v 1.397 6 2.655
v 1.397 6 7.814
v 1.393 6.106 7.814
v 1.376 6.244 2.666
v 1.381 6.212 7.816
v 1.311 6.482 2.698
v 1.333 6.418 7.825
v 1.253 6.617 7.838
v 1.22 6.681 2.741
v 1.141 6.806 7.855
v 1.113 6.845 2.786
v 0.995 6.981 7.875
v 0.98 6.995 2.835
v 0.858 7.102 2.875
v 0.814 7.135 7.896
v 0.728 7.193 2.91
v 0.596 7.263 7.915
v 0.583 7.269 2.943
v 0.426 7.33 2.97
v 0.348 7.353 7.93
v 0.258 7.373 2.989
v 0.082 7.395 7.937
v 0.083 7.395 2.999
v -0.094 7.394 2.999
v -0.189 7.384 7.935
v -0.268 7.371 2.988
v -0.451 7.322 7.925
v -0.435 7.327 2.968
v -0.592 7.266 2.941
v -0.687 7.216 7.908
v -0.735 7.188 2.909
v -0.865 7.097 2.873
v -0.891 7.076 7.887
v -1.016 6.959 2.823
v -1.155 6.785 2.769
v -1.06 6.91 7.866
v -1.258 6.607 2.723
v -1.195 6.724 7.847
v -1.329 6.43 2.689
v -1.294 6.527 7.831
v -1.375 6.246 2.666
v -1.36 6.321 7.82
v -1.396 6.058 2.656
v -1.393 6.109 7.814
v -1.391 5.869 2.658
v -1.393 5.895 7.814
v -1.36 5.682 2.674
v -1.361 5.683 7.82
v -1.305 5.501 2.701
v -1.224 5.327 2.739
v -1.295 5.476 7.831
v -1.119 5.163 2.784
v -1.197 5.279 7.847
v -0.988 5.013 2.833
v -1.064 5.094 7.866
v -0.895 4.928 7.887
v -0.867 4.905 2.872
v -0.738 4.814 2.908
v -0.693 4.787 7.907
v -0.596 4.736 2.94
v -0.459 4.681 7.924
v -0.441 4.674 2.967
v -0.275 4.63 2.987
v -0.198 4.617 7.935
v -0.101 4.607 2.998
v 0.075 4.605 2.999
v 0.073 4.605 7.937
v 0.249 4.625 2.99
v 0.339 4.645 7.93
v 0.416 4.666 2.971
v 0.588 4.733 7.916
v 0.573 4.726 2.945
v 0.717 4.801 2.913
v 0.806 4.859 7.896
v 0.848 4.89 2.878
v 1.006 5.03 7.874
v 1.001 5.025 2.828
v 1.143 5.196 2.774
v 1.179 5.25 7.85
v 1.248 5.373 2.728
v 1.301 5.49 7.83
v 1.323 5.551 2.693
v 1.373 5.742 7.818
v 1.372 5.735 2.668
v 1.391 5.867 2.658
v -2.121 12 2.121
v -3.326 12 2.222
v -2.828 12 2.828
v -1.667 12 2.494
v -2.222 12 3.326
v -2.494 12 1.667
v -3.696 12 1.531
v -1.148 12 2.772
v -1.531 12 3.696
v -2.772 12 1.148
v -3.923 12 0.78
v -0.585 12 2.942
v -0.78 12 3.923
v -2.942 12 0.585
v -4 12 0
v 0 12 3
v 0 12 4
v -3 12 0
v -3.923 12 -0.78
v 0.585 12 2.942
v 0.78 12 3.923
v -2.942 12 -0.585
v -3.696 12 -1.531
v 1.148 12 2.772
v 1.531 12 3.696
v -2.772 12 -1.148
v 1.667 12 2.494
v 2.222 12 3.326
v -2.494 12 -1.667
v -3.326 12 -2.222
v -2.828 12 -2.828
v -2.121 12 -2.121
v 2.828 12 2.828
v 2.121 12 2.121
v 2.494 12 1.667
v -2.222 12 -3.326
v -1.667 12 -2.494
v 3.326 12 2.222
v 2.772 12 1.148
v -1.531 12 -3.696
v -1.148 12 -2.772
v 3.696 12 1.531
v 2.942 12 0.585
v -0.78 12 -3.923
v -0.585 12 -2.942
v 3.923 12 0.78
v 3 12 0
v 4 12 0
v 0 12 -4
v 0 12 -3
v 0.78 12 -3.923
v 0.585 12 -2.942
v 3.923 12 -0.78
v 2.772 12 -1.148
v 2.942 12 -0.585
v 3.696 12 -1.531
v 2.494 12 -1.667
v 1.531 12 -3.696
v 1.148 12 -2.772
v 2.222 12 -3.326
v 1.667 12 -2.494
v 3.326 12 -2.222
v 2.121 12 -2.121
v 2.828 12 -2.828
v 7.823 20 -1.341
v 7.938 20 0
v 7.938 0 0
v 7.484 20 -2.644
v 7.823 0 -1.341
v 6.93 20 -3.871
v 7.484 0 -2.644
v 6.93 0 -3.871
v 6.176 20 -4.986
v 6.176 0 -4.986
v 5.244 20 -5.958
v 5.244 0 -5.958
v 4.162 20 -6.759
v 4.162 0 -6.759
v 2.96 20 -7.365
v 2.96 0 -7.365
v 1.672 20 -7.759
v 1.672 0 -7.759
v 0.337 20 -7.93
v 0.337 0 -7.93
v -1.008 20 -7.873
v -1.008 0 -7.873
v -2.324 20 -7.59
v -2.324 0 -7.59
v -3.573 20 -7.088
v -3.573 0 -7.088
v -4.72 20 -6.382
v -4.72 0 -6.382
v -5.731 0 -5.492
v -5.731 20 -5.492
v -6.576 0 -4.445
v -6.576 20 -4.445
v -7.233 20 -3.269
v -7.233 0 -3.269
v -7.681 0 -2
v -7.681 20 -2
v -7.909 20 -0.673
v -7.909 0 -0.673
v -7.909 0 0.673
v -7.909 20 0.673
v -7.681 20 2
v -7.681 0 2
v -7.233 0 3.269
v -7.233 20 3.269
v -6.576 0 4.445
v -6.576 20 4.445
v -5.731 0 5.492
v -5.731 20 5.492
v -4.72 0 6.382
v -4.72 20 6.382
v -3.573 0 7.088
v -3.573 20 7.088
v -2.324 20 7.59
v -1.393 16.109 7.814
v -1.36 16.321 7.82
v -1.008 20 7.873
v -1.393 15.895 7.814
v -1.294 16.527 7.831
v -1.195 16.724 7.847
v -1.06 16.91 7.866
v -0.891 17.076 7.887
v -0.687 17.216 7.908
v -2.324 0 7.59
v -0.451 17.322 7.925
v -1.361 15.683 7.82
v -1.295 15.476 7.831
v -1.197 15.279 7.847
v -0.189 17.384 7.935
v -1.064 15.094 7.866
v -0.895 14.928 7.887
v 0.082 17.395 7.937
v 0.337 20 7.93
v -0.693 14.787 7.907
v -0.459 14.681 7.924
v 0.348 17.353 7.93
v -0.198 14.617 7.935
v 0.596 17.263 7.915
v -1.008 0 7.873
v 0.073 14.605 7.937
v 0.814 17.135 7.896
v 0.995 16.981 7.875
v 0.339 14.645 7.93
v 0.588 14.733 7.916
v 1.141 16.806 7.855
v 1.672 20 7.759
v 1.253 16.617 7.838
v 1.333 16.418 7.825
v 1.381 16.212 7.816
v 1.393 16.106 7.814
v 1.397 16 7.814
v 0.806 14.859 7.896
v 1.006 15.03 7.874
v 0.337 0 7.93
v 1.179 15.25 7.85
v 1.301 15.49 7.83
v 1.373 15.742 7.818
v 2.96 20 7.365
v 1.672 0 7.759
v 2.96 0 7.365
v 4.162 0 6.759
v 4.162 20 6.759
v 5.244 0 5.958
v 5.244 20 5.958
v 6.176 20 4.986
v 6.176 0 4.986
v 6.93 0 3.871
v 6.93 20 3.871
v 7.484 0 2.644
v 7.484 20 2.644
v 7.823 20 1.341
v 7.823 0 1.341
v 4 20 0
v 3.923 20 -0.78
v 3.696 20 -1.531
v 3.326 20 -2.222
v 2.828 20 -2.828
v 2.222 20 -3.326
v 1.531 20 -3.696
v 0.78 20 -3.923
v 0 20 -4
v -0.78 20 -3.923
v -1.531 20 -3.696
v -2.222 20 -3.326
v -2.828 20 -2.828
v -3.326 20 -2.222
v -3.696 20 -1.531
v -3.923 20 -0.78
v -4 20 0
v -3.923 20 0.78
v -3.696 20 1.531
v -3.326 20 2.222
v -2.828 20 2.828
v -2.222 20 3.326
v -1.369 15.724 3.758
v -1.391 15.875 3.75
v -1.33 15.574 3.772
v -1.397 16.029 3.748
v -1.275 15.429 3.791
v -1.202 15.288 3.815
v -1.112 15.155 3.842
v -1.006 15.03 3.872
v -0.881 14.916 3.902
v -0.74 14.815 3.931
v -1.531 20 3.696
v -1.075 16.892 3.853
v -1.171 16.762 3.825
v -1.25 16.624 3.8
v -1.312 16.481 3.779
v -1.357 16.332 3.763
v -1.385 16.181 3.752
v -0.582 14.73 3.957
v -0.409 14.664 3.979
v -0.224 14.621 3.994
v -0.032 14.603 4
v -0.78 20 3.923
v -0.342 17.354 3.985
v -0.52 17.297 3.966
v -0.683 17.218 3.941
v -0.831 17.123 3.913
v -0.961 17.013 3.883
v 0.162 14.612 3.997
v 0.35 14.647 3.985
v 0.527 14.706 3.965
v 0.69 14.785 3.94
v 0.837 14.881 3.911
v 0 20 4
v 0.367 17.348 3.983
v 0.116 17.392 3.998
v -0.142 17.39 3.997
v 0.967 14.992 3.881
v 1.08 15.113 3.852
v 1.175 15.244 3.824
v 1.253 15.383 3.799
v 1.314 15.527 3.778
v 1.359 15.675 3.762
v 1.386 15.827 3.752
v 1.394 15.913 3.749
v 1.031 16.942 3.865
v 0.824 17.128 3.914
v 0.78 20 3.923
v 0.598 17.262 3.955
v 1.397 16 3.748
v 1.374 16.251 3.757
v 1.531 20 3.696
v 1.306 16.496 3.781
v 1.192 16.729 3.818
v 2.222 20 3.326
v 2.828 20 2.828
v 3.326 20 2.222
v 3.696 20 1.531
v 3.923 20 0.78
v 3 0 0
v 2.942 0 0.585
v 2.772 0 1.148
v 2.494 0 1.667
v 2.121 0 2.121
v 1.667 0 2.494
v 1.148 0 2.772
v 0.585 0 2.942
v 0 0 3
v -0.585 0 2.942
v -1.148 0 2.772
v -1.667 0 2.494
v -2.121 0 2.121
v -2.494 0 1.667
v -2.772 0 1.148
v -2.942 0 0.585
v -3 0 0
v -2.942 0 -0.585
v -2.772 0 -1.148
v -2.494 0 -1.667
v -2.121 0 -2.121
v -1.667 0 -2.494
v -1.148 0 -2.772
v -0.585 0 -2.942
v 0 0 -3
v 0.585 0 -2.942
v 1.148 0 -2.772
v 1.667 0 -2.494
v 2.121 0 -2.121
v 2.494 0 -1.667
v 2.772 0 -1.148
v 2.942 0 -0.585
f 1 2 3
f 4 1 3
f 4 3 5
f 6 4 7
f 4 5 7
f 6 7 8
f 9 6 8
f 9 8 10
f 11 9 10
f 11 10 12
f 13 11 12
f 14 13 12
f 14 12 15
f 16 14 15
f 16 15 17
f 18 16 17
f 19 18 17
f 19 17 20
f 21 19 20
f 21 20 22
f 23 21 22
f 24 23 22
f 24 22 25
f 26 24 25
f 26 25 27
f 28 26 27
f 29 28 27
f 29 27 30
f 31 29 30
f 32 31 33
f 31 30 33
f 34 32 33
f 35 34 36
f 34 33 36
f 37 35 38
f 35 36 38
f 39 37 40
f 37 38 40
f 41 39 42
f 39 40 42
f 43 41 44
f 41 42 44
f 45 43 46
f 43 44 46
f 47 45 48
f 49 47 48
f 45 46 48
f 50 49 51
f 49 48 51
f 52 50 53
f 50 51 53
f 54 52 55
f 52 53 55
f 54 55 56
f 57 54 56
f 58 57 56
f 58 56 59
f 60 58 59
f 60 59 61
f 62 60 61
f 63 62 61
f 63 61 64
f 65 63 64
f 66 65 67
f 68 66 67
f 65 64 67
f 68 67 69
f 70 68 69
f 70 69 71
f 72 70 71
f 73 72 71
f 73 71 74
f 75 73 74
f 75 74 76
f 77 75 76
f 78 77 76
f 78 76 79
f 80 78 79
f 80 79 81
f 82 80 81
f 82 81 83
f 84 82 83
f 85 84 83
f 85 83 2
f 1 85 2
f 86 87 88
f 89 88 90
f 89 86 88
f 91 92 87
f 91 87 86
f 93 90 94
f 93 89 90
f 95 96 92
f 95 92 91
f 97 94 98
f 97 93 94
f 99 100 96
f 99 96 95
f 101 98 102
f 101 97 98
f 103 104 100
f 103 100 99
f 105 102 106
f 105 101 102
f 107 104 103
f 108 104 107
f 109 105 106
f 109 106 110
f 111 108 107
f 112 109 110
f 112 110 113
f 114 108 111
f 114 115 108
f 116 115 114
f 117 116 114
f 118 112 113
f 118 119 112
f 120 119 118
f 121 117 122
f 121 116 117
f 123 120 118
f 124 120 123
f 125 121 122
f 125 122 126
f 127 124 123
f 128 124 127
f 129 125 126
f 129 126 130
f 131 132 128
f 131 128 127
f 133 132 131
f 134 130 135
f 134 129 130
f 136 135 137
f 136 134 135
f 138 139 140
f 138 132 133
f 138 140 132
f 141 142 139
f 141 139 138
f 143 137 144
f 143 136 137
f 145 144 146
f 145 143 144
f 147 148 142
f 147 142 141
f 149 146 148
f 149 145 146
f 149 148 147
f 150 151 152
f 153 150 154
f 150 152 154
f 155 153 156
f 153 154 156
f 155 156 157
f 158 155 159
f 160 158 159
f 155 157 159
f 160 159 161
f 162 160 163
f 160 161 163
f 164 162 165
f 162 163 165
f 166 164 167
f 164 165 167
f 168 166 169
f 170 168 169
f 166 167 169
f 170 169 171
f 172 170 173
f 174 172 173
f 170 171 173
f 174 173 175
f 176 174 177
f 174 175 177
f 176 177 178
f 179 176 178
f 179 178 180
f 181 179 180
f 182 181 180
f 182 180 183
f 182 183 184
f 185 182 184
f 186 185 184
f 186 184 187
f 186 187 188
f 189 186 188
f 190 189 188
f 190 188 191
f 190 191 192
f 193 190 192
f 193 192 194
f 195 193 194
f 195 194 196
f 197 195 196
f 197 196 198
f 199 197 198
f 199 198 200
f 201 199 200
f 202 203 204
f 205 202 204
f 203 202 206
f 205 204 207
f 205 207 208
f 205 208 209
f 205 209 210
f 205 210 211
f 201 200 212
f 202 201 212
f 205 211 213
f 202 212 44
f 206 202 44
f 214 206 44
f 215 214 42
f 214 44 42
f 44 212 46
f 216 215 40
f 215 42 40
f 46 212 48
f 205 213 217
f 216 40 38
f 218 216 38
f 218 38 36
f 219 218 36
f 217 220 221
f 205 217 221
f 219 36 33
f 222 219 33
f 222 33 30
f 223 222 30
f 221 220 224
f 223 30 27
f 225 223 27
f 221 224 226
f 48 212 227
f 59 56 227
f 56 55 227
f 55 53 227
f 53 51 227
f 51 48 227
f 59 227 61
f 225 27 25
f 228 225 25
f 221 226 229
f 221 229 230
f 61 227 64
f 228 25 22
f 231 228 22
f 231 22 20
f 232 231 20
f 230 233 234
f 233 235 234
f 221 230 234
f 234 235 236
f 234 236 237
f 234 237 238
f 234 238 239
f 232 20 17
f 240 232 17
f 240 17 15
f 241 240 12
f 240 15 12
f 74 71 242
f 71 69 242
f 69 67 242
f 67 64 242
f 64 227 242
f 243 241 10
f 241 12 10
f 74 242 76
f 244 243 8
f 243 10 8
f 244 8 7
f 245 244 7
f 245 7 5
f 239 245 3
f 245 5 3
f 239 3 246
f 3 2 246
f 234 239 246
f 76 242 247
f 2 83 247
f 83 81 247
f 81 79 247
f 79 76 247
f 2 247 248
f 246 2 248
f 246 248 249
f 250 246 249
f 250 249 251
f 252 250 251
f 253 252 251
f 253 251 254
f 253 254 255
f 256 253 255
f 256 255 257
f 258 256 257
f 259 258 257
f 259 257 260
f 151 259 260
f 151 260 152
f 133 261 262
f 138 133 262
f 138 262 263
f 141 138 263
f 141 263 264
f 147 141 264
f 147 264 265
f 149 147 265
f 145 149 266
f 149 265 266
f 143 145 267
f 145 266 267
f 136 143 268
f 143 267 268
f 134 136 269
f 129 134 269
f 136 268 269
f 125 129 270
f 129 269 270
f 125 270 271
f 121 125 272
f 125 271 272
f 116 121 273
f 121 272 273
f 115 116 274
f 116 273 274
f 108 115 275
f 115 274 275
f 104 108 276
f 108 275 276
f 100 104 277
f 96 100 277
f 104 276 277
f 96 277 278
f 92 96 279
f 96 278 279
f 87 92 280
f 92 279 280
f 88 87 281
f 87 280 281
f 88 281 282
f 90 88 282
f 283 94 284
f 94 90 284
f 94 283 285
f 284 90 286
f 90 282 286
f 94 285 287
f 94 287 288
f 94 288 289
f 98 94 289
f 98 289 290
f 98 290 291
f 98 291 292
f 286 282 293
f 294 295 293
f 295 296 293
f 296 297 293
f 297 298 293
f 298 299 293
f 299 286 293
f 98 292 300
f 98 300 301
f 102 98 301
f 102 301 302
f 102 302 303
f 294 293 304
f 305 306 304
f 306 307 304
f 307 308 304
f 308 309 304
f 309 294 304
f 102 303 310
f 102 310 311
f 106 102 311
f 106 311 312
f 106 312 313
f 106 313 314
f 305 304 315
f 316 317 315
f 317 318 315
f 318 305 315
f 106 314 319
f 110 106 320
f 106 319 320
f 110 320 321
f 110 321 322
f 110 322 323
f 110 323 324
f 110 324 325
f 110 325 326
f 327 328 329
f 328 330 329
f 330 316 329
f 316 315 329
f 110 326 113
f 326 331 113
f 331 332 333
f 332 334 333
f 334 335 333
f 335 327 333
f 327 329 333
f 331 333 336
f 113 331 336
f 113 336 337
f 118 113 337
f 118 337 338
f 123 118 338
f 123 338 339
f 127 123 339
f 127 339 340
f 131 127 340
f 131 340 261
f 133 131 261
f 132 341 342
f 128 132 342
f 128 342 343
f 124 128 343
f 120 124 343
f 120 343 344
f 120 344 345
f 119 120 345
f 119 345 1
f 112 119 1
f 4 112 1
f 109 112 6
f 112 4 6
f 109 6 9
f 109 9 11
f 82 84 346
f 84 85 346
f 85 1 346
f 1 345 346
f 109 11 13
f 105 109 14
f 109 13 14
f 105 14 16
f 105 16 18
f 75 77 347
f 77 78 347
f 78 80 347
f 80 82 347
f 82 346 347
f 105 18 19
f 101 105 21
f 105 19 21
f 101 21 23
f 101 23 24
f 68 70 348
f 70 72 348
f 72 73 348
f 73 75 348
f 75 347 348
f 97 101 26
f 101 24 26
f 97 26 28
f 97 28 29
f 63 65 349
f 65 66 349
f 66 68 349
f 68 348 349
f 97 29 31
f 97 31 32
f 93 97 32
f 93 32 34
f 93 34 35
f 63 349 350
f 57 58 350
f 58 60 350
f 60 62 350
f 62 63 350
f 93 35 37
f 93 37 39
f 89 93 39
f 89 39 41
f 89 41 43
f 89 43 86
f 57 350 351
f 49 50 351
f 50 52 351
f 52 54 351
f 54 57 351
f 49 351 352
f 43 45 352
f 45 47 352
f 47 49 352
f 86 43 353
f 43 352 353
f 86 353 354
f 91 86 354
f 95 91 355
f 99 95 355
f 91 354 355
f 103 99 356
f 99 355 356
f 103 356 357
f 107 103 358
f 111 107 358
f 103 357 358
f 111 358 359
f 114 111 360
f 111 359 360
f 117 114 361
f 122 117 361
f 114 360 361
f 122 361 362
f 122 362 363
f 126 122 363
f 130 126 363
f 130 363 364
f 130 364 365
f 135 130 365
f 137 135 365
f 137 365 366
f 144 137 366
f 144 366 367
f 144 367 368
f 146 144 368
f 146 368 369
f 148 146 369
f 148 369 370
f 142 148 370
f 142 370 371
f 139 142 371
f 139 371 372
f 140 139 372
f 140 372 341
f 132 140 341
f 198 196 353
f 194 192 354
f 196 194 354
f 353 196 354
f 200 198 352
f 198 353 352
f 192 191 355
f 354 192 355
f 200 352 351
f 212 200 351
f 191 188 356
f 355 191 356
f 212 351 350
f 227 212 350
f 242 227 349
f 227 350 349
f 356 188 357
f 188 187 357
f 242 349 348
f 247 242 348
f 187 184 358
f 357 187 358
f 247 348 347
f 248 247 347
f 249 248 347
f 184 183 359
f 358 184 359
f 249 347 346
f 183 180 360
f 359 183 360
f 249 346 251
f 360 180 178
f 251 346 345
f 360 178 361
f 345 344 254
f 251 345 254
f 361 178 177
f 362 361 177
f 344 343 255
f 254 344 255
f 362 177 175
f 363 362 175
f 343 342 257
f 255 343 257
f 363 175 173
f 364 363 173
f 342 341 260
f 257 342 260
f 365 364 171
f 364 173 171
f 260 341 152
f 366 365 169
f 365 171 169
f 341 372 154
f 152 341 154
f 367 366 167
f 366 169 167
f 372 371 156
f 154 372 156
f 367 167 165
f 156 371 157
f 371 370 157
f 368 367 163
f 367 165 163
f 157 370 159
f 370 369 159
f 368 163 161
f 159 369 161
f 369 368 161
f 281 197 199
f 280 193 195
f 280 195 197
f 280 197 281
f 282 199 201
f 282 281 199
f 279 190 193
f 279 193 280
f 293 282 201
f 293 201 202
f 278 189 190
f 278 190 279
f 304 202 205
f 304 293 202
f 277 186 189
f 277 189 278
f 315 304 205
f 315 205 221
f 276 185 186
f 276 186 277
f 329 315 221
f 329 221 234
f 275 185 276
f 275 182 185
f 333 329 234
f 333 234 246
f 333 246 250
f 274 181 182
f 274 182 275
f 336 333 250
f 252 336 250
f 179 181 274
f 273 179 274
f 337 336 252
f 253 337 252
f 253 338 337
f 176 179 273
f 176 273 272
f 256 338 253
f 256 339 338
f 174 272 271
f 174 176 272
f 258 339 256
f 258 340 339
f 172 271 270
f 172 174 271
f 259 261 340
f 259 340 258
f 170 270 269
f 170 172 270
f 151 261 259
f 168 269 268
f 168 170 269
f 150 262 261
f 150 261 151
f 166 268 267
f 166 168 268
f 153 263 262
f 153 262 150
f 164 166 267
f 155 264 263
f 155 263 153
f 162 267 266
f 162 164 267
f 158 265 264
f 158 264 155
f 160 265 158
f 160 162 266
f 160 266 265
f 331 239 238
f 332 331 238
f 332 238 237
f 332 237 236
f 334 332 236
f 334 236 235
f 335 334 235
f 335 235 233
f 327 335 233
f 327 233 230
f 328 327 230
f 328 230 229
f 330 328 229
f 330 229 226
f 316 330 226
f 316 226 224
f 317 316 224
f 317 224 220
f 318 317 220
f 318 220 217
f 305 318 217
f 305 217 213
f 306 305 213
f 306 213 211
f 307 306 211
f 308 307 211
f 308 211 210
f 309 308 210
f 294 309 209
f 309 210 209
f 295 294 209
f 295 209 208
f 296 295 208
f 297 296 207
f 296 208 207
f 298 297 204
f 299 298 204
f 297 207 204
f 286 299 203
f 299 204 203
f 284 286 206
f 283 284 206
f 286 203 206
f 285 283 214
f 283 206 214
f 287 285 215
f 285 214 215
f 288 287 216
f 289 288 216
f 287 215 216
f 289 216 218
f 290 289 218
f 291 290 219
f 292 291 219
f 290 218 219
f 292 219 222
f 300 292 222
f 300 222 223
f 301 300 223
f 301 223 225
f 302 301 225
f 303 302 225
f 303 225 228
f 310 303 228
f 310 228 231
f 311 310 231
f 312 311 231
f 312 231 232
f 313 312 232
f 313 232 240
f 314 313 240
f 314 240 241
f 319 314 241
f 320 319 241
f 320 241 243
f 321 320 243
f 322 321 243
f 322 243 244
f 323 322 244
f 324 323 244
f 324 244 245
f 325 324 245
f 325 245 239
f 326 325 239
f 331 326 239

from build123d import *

# Parameters (mm, degrees)
SKETCH2_R           = 7.9375
BOSS_EXTRUDE1_DEPTH = 20
SKETCH3_R           = 4
CUT_EXTRUDE1_DEPTH  = 8
SKETCH4_R           = 3
CUT_EXTRUDE2_DEPTH  = 12
SKETCH6_R           = 1.397
CUT_EXTRUDE3_DEPTH  = 6


with BuildPart() as part:
    # Sketch2 → Boss-Extrude1 (new body)
    with BuildSketch(Plane(origin=(0, 0, 0), x_dir=(1, 0, 0), z_dir=(0, 1, 0))):
        Circle(SKETCH2_R)
    extrude(amount=BOSS_EXTRUDE1_DEPTH)

    # Sketch3 → Cut-Extrude1 (cut)
    with BuildSketch(Plane(origin=(0, 20, 0), x_dir=(1, 0, 0), z_dir=(0, 1, 0))):
        Circle(SKETCH3_R)
    extrude(amount=-CUT_EXTRUDE1_DEPTH, mode=Mode.SUBTRACT)

    # Sketch4 → Cut-Extrude2 (cut)
    with BuildSketch(Plane.XZ):
        Circle(SKETCH4_R)
    extrude(amount=-CUT_EXTRUDE2_DEPTH, mode=Mode.SUBTRACT)

    # Sketch6 → Cut-Extrude3 (cut)
    with BuildSketch(Plane.XY.offset(7.9375)):
        with Locations((0, 6)):
            Circle(SKETCH6_R)
        with Locations((0, 16)):
            Circle(SKETCH6_R)
    extrude(amount=-CUT_EXTRUDE3_DEPTH, mode=Mode.SUBTRACT)


solid = part.part
